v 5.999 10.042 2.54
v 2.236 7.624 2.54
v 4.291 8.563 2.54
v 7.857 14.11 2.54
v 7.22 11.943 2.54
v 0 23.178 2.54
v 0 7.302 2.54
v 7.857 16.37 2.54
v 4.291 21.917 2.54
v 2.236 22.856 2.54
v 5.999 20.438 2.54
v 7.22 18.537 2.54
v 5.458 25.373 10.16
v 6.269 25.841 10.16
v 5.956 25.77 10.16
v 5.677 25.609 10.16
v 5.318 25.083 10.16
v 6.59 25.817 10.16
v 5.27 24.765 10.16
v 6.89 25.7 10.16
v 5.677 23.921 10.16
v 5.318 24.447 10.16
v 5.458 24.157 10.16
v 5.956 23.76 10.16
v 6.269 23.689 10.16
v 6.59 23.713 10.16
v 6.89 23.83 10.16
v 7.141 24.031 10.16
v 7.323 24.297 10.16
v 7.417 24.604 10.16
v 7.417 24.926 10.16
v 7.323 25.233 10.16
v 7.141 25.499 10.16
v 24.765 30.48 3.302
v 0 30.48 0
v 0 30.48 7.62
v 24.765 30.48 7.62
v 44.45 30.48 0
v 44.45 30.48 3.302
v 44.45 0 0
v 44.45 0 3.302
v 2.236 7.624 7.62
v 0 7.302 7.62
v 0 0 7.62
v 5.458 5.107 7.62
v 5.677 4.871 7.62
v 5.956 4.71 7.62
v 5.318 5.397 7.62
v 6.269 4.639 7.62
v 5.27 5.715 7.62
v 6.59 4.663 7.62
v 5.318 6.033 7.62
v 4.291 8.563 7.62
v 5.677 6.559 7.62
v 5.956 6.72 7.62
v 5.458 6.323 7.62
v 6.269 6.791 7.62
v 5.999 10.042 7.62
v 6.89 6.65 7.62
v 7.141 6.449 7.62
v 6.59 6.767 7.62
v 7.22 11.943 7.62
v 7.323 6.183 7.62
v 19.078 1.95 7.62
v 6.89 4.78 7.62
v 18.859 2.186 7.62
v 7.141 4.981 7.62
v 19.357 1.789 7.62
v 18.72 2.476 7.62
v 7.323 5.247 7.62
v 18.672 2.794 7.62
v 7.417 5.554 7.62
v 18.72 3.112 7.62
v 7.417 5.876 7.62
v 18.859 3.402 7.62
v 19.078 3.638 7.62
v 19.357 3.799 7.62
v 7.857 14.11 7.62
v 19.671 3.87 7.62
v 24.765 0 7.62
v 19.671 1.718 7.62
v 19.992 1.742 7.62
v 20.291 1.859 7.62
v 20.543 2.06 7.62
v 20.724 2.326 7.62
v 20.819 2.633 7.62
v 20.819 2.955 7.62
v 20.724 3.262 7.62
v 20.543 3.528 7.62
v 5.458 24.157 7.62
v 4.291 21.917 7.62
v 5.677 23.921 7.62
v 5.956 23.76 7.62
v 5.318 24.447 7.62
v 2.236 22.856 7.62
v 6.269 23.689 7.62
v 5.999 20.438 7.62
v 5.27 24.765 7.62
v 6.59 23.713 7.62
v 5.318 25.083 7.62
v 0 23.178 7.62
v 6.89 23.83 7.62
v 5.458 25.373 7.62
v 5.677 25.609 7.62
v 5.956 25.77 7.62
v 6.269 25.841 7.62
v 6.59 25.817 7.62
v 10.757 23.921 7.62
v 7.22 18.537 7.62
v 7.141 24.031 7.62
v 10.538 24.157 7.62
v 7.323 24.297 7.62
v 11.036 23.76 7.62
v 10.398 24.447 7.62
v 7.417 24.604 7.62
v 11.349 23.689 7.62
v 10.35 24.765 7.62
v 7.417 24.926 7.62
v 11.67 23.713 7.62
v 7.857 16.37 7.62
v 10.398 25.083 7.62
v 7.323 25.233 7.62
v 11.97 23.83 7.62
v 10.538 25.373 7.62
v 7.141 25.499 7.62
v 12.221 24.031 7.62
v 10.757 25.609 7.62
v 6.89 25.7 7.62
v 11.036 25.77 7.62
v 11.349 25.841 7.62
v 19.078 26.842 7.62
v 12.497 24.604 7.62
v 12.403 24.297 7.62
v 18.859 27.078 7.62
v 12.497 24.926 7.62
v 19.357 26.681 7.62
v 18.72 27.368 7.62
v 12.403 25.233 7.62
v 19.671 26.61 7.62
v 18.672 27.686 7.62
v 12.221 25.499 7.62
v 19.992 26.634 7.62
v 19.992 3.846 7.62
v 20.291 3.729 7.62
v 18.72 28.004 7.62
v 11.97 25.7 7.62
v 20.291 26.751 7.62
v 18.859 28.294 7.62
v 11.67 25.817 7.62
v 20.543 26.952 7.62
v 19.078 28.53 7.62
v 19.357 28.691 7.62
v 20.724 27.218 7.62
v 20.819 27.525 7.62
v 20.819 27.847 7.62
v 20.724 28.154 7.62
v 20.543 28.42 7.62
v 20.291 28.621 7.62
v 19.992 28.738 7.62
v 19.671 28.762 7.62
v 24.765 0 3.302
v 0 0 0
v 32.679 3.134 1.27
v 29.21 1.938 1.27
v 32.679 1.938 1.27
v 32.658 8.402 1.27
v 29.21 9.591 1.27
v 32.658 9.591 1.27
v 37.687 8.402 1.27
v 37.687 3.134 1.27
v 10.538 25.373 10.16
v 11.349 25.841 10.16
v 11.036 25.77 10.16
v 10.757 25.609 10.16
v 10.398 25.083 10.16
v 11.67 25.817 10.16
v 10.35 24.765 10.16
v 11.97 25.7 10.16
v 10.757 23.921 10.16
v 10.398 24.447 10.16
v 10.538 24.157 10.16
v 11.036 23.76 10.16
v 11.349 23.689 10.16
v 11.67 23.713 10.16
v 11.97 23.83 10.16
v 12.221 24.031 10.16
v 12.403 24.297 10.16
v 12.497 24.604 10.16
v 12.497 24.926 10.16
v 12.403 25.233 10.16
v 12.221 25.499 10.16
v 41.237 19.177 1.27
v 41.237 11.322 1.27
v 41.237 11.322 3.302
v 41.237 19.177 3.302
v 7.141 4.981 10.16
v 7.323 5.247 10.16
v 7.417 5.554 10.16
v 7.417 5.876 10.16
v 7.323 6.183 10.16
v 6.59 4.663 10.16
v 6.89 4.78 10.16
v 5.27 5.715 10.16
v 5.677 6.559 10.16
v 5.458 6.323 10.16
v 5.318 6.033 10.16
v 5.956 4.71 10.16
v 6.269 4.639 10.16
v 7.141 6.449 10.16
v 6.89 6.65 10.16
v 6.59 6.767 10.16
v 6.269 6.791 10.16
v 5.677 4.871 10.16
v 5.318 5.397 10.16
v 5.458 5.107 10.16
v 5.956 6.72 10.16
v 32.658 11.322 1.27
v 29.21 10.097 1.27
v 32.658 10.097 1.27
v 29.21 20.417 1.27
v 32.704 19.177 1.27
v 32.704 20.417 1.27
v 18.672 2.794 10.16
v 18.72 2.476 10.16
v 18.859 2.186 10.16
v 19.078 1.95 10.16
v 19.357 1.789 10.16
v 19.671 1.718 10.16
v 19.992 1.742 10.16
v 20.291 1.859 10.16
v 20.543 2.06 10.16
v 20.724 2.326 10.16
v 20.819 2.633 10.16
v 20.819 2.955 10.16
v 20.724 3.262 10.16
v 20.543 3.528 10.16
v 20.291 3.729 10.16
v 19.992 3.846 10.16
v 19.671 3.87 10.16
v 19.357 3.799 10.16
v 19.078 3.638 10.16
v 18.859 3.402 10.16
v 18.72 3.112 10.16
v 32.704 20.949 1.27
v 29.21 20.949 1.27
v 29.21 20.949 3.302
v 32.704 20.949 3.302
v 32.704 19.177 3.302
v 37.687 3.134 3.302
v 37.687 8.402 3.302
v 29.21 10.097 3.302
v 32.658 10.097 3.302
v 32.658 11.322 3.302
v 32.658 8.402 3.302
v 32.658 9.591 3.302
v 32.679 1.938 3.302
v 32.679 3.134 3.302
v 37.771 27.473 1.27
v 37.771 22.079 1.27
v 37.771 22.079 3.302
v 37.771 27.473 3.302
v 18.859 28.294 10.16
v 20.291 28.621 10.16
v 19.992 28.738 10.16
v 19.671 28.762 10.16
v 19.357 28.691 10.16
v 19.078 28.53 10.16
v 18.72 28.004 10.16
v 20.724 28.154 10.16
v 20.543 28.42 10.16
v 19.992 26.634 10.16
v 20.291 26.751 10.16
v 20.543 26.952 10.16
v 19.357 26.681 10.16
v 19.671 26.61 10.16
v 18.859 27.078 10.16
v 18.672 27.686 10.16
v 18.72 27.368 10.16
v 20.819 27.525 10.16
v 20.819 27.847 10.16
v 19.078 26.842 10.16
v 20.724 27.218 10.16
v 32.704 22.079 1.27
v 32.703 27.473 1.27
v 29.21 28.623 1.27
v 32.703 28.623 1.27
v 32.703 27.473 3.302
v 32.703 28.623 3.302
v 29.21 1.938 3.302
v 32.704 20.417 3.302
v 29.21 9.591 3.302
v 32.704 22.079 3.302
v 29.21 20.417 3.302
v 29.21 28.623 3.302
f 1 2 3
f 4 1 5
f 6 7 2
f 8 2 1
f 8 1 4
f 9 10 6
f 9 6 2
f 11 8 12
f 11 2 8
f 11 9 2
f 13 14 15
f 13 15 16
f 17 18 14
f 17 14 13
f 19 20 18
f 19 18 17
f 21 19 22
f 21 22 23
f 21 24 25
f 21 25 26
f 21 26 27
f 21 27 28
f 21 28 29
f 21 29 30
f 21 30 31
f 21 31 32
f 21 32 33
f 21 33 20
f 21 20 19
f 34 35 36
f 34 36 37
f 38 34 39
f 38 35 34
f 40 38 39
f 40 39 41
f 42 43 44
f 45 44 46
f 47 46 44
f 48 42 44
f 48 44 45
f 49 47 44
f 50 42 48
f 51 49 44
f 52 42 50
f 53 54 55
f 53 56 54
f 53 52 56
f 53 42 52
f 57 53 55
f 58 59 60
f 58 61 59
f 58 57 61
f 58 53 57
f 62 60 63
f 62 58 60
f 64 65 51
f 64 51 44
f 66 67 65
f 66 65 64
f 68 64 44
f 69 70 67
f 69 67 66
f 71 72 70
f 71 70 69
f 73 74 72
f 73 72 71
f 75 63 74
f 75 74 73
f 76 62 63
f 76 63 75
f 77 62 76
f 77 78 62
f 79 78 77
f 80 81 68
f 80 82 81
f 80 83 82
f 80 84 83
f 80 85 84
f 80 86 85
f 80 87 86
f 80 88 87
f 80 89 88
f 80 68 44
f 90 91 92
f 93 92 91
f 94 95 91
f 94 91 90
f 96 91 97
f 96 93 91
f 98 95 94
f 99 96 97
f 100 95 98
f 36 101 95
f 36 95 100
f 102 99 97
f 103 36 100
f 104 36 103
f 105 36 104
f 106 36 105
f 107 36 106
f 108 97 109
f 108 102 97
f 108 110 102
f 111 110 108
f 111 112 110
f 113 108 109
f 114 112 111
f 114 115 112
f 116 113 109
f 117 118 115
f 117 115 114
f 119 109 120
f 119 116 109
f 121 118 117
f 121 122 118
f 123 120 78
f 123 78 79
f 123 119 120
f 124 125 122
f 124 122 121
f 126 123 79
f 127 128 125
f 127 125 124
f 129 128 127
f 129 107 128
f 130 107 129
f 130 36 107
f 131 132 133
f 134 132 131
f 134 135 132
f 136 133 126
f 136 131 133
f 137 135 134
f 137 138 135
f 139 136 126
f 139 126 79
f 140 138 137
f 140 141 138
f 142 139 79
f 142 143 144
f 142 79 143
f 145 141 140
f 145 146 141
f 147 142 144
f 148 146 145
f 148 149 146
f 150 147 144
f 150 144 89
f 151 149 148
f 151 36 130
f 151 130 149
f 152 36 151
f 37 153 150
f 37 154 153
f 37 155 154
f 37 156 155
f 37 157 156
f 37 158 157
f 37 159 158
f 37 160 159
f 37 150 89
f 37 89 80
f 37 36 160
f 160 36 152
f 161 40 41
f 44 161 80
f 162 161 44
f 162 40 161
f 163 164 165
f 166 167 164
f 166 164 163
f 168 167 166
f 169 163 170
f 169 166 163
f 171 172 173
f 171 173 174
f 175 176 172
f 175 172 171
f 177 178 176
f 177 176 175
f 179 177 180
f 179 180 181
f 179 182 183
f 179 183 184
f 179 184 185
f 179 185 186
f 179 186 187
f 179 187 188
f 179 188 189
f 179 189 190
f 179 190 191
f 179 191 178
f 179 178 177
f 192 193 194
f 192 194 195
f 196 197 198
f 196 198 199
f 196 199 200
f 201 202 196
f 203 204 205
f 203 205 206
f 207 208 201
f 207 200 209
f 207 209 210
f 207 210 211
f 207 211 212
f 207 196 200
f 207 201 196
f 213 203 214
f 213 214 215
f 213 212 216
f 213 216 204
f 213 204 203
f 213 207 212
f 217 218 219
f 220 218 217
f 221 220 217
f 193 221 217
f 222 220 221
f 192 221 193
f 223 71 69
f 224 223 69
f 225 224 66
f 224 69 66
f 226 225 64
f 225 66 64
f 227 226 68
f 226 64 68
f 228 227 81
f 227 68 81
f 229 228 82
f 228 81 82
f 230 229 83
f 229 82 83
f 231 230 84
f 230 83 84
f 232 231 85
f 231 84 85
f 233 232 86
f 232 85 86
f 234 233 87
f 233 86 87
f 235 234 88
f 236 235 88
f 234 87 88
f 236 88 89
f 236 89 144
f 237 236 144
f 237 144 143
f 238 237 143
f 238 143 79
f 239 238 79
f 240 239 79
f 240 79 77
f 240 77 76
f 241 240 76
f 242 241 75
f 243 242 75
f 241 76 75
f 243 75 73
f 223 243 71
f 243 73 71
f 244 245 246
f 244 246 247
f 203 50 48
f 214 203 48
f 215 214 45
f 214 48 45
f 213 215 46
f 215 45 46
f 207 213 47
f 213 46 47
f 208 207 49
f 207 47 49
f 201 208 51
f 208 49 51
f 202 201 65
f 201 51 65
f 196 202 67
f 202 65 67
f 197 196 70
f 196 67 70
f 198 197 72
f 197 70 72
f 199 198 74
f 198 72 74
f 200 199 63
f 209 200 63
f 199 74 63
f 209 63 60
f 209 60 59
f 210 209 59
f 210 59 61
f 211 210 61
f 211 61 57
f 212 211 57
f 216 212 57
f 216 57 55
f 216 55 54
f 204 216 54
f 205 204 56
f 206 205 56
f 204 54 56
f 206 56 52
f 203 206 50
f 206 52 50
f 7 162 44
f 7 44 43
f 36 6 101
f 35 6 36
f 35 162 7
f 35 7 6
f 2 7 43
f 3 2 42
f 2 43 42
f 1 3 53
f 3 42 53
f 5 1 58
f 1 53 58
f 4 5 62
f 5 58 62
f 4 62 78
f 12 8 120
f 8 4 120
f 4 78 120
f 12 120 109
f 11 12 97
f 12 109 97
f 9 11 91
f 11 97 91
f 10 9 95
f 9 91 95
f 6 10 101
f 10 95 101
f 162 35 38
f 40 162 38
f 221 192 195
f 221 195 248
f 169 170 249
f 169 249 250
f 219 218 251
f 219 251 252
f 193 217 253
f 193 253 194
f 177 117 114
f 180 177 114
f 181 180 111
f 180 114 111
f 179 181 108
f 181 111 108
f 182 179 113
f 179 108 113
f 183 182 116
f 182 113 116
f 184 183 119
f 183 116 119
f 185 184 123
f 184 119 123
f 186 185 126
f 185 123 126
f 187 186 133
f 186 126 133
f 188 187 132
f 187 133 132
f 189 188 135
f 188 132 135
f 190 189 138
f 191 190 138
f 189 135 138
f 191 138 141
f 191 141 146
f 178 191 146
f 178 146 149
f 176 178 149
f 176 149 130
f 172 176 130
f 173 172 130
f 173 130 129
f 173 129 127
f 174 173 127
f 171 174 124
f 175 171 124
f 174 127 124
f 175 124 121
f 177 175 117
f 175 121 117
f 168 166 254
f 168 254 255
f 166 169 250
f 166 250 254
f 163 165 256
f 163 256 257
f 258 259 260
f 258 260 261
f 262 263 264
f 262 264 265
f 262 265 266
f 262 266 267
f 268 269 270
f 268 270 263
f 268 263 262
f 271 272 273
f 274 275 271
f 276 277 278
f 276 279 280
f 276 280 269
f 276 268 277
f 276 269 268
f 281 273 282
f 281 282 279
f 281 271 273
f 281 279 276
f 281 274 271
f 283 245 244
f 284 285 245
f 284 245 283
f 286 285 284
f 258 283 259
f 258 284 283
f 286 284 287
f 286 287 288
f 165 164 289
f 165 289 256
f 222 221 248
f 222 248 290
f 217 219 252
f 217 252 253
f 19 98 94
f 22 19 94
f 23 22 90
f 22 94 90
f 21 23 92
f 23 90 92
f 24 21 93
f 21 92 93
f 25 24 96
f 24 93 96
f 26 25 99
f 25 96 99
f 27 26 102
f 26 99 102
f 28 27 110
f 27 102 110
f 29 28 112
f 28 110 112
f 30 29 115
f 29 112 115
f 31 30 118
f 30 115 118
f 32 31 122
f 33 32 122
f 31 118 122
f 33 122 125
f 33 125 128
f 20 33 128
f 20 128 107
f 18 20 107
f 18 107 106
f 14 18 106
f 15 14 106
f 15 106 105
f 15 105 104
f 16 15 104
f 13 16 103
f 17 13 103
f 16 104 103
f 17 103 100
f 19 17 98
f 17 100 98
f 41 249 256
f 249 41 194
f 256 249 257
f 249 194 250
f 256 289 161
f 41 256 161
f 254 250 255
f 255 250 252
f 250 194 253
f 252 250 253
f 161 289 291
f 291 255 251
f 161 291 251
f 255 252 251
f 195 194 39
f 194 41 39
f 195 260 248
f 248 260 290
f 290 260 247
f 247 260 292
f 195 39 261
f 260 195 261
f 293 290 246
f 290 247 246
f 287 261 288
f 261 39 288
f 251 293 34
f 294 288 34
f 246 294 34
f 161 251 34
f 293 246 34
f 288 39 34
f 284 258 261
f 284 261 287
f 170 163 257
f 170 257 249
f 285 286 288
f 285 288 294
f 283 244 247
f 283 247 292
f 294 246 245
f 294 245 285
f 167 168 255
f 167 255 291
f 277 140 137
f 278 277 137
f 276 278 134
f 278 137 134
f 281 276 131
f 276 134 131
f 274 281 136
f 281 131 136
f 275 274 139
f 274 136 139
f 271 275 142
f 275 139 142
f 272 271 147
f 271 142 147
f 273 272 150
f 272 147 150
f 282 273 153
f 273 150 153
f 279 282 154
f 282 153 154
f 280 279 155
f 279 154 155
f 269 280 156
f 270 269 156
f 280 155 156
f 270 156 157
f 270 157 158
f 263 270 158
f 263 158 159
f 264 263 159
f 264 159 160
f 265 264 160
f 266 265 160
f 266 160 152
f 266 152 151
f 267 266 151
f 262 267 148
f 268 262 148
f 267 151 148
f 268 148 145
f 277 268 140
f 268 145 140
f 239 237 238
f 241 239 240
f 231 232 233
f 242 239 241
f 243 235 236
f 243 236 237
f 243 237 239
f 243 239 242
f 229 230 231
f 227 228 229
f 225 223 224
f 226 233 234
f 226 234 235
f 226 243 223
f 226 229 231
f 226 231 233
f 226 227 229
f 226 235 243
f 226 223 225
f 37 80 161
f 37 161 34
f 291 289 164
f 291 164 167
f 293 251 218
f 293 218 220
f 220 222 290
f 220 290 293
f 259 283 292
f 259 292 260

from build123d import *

# Parameters (mm, degrees)
SKETCH1_W           = 44.45
SKETCH1_H           = 30.48
BOSS_EXTRUDE1_DEPTH = 7.62
SKETCH2_R           = 1.0795
BOSS_EXTRUDE2_DEPTH = 2.54
SKETCH3_R           = 7.9375
CUT_EXTRUDE1_DEPTH  = 5.08
SKETCH4_W           = 15.24
SKETCH4_H           = 30.48
CUT_EXTRUDE2_DEPTH  = 6.35
SKETCH5_W           = 4.445
SKETCH5_H           = 30.48
CUT_EXTRUDE3_DEPTH  = 4.318
BOSS_EXTRUDE3_DEPTH = 2.032


with BuildPart() as part:
    # Sketch1 → Boss-Extrude1 (new body)
    with BuildSketch(Plane.XY):
        with Locations((22.225, 15.24)):
            Rectangle(SKETCH1_W, SKETCH1_H)
    extrude(amount=BOSS_EXTRUDE1_DEPTH)

    # Sketch2 → Boss-Extrude2 (add)
    with BuildSketch(Plane.XY.offset(7.62)):
        with Locations(Location((6.35, 24.765, 0), (0, 0, 180))):
            Circle(SKETCH2_R)
        with Locations(Location((6.35, 5.715, 0), (0, 0, 180))):
            Circle(SKETCH2_R)
        with Locations(Location((11.43, 24.765, 0), (0, 0, 180))):
            Circle(SKETCH2_R)
        with Locations(Location((19.7513587, 27.686, 0), (0, 0, 180))):
            Circle(SKETCH2_R)
        with Locations(Location((19.7513587, 2.794, 0), (0, 0, 180))):
            Circle(SKETCH2_R)
    extrude(amount=BOSS_EXTRUDE2_DEPTH)

    # Sketch3 → Cut-Extrude1 (cut)
    with BuildSketch(Plane.XY.offset(7.62)):
        with Locations((0, 15.24)):
            Circle(SKETCH3_R)
    extrude(amount=-CUT_EXTRUDE1_DEPTH, mode=Mode.SUBTRACT)

    # Sketch4 → Cut-Extrude2 (cut)
    with BuildSketch(Plane.XY.offset(7.62)):
        with Locations((36.83, 15.24)):
            Rectangle(SKETCH4_W, SKETCH4_H)
    extrude(amount=-CUT_EXTRUDE2_DEPTH, mode=Mode.SUBTRACT)

    # Sketch5 → Cut-Extrude3 (cut)
    with BuildSketch(Plane.XY.offset(7.62)):
        with Locations((26.9875, 15.24)):
            Rectangle(SKETCH5_W, SKETCH5_H)
    extrude(amount=-CUT_EXTRUDE3_DEPTH, mode=Mode.SUBTRACT)

    # Sketch6 → Boss-Extrude3 (add)
    with BuildSketch(Plane.XY.offset(1.27)):
        Polygon((29.21, 0), (29.21, 1.93778588), (32.678761959, 1.93778588), (32.678761959, 3.133507731), (37.686930292, 3.133507731), (37.686930292, 8.402137785), (32.658263267, 8.402137785), (32.658263267, 9.590598202), (29.21, 9.590598202), (29.21, 10.097072894), (32.658263267, 10.097072894), (32.658263267, 11.322249124), (41.237467305, 11.322249124), (41.237467305, 19.177308186), (32.703717585, 19.177308186), (32.703717585, 20.417489762), (29.21, 20.417489762), (29.21, 20.9492523), (32.703717585, 20.9492523), (32.703717585, 22.079298556), (37.771400605, 22.079298556), (37.771400605, 27.473279734), (32.702551474, 27.473279734), (32.702551474, 28.622642458), (29.21, 28.622642458), (29.21, 30.48), (44.45, 30.48), (44.45, 0), align=None)
    extrude(amount=BOSS_EXTRUDE3_DEPTH)


solid = part.part
